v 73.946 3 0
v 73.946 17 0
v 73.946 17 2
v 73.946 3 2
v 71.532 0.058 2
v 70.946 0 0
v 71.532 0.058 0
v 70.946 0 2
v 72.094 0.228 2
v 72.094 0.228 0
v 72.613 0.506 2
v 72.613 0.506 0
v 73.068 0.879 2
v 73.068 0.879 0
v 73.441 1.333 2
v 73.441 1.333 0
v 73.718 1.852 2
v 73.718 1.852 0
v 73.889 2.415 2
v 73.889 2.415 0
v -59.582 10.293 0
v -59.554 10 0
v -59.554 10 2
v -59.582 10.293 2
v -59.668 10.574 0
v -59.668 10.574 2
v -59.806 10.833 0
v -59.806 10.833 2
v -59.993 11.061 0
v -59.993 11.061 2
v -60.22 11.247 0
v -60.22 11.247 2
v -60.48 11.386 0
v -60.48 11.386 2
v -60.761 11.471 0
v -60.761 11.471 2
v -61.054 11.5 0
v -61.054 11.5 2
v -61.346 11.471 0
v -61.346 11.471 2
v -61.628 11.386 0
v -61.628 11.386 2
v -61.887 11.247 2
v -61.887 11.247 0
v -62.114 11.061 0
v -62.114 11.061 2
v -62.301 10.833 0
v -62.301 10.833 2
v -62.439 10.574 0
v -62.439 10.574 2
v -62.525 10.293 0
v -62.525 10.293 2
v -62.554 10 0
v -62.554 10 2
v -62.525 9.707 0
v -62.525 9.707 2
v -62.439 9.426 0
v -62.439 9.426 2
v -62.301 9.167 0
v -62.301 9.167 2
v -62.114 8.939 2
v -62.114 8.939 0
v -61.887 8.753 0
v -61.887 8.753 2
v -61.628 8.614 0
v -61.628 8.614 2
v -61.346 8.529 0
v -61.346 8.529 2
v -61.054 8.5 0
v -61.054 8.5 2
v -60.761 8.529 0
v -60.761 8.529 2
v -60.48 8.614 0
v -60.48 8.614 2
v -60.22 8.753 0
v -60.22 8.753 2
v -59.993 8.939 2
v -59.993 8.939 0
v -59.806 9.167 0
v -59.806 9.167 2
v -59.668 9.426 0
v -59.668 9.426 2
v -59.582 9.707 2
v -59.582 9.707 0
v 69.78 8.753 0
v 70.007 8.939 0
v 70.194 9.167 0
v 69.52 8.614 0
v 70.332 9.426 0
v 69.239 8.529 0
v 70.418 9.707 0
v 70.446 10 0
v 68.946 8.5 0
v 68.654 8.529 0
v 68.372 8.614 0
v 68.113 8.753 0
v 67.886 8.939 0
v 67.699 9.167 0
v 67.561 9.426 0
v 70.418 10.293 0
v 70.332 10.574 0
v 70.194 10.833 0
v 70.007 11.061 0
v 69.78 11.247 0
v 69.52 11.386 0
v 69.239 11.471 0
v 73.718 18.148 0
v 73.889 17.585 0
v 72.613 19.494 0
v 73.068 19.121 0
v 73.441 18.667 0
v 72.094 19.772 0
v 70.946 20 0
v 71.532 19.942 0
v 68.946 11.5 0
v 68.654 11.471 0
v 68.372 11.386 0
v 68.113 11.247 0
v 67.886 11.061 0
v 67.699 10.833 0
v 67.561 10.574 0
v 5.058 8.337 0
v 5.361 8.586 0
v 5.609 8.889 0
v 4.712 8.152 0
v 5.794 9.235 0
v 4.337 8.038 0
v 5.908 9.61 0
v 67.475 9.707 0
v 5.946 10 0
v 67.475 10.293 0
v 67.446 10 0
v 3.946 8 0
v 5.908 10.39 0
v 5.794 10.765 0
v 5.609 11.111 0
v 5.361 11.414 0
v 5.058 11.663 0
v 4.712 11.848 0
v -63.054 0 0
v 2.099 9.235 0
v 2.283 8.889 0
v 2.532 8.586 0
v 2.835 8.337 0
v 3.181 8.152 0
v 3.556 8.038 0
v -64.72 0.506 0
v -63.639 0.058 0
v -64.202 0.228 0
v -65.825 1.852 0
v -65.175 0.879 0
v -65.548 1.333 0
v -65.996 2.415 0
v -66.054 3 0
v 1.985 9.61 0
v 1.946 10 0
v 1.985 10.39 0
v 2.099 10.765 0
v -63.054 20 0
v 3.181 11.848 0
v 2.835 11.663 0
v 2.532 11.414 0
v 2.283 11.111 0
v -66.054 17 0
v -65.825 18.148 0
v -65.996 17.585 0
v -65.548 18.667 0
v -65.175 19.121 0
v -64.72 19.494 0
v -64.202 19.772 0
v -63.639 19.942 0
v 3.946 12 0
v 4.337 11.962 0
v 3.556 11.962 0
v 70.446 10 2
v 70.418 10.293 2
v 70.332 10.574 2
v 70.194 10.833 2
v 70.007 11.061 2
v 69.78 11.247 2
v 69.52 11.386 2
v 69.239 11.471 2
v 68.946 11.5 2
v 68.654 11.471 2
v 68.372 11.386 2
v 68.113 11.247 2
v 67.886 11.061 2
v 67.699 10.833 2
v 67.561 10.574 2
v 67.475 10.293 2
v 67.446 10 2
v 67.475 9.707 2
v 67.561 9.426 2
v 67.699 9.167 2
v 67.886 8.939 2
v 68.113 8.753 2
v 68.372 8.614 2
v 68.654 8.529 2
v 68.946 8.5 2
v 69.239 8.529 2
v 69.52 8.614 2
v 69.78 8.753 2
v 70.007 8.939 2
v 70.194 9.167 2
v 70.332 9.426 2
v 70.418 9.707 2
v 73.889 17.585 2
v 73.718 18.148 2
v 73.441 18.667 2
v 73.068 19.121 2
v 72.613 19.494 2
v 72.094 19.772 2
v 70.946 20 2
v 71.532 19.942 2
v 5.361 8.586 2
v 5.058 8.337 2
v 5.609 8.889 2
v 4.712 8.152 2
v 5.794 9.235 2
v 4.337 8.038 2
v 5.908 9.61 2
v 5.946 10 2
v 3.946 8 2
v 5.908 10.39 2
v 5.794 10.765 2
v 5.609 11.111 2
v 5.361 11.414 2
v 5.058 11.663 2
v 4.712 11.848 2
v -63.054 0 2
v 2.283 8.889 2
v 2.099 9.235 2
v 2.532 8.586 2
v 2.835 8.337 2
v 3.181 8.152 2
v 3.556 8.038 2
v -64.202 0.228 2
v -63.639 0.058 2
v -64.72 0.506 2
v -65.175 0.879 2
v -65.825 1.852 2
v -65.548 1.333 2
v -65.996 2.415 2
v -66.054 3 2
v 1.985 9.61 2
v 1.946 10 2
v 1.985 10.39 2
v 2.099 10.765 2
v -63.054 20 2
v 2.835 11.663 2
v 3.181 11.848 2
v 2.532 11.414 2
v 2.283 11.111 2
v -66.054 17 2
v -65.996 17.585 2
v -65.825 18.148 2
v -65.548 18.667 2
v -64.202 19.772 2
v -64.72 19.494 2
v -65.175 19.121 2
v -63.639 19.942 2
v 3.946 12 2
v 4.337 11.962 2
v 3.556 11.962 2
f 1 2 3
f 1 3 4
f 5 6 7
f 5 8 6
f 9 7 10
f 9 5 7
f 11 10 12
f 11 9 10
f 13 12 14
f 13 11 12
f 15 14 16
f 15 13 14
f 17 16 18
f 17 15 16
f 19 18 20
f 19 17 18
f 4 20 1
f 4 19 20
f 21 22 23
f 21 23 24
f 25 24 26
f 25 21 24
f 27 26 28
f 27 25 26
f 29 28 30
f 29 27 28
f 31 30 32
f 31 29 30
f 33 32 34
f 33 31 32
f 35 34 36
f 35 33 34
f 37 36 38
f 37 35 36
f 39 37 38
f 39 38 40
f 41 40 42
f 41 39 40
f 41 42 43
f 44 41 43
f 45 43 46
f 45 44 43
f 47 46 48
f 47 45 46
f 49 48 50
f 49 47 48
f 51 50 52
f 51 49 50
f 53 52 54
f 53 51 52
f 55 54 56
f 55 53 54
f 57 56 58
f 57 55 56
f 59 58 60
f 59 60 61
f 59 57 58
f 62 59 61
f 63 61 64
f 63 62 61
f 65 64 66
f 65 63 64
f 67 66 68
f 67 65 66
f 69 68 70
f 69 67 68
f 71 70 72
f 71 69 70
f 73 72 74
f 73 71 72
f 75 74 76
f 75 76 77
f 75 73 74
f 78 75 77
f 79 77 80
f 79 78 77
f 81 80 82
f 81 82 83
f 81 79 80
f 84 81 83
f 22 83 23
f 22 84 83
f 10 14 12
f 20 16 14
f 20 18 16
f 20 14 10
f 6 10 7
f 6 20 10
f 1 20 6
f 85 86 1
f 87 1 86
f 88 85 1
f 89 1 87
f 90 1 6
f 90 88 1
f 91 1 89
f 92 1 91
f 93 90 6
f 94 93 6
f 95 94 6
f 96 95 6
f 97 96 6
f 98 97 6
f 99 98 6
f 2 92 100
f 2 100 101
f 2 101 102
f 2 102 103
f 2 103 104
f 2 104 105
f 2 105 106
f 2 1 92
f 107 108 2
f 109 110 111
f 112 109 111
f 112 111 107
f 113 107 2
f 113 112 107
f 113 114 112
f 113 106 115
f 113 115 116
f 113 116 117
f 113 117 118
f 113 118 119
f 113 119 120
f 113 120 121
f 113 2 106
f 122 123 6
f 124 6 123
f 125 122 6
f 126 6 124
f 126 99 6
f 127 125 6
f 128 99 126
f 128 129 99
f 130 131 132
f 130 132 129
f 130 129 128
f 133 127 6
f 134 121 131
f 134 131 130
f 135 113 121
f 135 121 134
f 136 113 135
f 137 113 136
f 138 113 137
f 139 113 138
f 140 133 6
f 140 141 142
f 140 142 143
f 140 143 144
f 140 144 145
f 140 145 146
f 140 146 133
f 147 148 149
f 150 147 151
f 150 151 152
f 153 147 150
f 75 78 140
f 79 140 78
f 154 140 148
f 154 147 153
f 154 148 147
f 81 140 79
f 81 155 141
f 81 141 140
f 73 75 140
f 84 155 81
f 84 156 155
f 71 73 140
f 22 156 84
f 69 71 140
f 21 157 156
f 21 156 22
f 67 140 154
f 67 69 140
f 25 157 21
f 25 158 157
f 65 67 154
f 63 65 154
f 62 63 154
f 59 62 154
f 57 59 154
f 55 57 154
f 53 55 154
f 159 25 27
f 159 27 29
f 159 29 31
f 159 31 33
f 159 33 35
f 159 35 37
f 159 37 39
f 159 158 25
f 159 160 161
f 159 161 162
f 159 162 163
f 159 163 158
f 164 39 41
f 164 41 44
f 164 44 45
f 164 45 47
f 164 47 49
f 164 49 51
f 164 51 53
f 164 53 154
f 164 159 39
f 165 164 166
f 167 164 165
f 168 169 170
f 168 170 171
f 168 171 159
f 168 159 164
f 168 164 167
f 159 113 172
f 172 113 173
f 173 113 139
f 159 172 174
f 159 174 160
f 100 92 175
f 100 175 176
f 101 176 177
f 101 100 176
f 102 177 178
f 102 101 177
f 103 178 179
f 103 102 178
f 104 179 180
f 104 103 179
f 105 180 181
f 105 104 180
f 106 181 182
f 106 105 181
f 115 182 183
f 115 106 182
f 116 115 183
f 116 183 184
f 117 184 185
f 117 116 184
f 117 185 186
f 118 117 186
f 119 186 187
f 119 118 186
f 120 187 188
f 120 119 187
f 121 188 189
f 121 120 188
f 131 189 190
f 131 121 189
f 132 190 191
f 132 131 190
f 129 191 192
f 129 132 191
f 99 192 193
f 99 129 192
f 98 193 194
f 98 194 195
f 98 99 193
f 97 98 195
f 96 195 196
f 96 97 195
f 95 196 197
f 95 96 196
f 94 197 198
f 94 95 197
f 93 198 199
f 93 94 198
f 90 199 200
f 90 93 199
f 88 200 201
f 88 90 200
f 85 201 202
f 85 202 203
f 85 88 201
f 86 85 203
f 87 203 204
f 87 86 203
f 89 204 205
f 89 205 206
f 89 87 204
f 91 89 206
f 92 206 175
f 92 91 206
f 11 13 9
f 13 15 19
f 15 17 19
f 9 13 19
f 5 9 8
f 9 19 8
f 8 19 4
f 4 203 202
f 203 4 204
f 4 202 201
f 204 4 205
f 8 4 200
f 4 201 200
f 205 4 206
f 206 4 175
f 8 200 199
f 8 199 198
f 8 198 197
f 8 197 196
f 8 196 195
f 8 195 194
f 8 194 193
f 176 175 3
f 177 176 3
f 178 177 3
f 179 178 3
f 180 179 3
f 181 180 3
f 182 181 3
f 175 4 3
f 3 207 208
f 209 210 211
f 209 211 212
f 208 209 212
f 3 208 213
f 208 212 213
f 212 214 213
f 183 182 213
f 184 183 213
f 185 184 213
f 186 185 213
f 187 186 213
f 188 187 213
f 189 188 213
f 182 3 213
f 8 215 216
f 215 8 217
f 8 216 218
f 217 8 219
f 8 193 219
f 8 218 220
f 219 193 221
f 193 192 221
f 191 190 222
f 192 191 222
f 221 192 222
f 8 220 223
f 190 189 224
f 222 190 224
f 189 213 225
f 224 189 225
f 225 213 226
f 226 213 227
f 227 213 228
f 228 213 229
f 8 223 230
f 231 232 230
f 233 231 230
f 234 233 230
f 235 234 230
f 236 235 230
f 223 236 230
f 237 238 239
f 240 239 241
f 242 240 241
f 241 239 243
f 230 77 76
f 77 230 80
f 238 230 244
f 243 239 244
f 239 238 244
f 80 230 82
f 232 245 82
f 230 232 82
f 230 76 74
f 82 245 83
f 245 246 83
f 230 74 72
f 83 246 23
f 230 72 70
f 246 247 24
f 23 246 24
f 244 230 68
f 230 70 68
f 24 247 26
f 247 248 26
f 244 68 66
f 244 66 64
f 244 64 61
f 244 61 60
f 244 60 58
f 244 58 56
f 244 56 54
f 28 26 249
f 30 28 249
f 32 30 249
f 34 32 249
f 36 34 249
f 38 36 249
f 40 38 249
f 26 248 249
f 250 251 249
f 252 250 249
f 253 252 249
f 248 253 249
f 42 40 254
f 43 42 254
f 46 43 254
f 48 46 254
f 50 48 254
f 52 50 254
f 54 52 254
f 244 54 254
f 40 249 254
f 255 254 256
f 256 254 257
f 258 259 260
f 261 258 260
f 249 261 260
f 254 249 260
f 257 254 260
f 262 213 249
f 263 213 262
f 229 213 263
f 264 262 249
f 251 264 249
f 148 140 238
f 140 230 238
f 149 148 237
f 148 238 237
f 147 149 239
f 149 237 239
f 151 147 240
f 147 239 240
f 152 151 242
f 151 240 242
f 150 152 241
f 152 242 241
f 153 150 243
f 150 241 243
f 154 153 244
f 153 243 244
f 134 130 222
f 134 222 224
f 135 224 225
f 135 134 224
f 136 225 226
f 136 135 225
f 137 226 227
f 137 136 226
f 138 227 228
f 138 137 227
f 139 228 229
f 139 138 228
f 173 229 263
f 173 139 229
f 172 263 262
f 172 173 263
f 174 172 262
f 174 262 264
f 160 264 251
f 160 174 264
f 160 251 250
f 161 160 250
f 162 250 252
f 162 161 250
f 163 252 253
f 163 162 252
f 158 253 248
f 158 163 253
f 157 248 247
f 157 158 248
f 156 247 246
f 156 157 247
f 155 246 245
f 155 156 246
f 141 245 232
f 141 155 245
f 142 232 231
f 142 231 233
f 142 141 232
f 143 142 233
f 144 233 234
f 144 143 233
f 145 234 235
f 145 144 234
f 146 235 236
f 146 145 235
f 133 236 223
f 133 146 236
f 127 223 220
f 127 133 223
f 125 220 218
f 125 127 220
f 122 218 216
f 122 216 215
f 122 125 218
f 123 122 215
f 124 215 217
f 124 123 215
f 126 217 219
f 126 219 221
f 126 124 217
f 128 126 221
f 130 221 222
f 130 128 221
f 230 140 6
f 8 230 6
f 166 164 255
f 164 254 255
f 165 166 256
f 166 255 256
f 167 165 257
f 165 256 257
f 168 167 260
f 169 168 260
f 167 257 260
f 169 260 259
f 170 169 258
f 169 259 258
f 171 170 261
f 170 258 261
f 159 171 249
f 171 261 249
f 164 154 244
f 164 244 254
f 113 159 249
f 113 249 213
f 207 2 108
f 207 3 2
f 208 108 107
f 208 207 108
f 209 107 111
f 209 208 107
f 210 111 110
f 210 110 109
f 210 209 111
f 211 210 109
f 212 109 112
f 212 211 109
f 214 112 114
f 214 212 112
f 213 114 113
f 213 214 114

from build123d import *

# Parameters (mm, degrees)
IZIM1_R                     = 2
IZIM1_R_2                   = 1.5
Y_KSEKLIK_EKSTR_ZYON1_DEPTH = 2
RADYUS1_R                   = 3


with BuildPart() as part:
    # Çizim1 → Yükseklik-Ekstrüzyon1 (new body)
    with BuildSketch(Plane.XY):
        Polygon((0, 0), (-66.053561945, 0), (-66.053561945, 20), (73.946438055, 20), (73.946438055, 0), align=None)
        with Locations((3.946438055, 10)):
            Circle(IZIM1_R, mode=Mode.SUBTRACT)
        with Locations((-61.053561945, 10)):
            Circle(IZIM1_R_2, mode=Mode.SUBTRACT)
        with Locations((68.946438055, 10)):
            Circle(IZIM1_R_2, mode=Mode.SUBTRACT)
    extrude(amount=Y_KSEKLIK_EKSTR_ZYON1_DEPTH)

    # Radyus1
    radyus1_edges = [part.edges().sort_by_distance(p)[0] for p in [
        (-66.053561945, 0, 1),
        (-66.053561945, 20, 1),
        (73.946438055, 20, 1),
        (73.946438055, 0, 1),
    ]]
    fillet(radyus1_edges, radius=RADYUS1_R)


solid = part.part
